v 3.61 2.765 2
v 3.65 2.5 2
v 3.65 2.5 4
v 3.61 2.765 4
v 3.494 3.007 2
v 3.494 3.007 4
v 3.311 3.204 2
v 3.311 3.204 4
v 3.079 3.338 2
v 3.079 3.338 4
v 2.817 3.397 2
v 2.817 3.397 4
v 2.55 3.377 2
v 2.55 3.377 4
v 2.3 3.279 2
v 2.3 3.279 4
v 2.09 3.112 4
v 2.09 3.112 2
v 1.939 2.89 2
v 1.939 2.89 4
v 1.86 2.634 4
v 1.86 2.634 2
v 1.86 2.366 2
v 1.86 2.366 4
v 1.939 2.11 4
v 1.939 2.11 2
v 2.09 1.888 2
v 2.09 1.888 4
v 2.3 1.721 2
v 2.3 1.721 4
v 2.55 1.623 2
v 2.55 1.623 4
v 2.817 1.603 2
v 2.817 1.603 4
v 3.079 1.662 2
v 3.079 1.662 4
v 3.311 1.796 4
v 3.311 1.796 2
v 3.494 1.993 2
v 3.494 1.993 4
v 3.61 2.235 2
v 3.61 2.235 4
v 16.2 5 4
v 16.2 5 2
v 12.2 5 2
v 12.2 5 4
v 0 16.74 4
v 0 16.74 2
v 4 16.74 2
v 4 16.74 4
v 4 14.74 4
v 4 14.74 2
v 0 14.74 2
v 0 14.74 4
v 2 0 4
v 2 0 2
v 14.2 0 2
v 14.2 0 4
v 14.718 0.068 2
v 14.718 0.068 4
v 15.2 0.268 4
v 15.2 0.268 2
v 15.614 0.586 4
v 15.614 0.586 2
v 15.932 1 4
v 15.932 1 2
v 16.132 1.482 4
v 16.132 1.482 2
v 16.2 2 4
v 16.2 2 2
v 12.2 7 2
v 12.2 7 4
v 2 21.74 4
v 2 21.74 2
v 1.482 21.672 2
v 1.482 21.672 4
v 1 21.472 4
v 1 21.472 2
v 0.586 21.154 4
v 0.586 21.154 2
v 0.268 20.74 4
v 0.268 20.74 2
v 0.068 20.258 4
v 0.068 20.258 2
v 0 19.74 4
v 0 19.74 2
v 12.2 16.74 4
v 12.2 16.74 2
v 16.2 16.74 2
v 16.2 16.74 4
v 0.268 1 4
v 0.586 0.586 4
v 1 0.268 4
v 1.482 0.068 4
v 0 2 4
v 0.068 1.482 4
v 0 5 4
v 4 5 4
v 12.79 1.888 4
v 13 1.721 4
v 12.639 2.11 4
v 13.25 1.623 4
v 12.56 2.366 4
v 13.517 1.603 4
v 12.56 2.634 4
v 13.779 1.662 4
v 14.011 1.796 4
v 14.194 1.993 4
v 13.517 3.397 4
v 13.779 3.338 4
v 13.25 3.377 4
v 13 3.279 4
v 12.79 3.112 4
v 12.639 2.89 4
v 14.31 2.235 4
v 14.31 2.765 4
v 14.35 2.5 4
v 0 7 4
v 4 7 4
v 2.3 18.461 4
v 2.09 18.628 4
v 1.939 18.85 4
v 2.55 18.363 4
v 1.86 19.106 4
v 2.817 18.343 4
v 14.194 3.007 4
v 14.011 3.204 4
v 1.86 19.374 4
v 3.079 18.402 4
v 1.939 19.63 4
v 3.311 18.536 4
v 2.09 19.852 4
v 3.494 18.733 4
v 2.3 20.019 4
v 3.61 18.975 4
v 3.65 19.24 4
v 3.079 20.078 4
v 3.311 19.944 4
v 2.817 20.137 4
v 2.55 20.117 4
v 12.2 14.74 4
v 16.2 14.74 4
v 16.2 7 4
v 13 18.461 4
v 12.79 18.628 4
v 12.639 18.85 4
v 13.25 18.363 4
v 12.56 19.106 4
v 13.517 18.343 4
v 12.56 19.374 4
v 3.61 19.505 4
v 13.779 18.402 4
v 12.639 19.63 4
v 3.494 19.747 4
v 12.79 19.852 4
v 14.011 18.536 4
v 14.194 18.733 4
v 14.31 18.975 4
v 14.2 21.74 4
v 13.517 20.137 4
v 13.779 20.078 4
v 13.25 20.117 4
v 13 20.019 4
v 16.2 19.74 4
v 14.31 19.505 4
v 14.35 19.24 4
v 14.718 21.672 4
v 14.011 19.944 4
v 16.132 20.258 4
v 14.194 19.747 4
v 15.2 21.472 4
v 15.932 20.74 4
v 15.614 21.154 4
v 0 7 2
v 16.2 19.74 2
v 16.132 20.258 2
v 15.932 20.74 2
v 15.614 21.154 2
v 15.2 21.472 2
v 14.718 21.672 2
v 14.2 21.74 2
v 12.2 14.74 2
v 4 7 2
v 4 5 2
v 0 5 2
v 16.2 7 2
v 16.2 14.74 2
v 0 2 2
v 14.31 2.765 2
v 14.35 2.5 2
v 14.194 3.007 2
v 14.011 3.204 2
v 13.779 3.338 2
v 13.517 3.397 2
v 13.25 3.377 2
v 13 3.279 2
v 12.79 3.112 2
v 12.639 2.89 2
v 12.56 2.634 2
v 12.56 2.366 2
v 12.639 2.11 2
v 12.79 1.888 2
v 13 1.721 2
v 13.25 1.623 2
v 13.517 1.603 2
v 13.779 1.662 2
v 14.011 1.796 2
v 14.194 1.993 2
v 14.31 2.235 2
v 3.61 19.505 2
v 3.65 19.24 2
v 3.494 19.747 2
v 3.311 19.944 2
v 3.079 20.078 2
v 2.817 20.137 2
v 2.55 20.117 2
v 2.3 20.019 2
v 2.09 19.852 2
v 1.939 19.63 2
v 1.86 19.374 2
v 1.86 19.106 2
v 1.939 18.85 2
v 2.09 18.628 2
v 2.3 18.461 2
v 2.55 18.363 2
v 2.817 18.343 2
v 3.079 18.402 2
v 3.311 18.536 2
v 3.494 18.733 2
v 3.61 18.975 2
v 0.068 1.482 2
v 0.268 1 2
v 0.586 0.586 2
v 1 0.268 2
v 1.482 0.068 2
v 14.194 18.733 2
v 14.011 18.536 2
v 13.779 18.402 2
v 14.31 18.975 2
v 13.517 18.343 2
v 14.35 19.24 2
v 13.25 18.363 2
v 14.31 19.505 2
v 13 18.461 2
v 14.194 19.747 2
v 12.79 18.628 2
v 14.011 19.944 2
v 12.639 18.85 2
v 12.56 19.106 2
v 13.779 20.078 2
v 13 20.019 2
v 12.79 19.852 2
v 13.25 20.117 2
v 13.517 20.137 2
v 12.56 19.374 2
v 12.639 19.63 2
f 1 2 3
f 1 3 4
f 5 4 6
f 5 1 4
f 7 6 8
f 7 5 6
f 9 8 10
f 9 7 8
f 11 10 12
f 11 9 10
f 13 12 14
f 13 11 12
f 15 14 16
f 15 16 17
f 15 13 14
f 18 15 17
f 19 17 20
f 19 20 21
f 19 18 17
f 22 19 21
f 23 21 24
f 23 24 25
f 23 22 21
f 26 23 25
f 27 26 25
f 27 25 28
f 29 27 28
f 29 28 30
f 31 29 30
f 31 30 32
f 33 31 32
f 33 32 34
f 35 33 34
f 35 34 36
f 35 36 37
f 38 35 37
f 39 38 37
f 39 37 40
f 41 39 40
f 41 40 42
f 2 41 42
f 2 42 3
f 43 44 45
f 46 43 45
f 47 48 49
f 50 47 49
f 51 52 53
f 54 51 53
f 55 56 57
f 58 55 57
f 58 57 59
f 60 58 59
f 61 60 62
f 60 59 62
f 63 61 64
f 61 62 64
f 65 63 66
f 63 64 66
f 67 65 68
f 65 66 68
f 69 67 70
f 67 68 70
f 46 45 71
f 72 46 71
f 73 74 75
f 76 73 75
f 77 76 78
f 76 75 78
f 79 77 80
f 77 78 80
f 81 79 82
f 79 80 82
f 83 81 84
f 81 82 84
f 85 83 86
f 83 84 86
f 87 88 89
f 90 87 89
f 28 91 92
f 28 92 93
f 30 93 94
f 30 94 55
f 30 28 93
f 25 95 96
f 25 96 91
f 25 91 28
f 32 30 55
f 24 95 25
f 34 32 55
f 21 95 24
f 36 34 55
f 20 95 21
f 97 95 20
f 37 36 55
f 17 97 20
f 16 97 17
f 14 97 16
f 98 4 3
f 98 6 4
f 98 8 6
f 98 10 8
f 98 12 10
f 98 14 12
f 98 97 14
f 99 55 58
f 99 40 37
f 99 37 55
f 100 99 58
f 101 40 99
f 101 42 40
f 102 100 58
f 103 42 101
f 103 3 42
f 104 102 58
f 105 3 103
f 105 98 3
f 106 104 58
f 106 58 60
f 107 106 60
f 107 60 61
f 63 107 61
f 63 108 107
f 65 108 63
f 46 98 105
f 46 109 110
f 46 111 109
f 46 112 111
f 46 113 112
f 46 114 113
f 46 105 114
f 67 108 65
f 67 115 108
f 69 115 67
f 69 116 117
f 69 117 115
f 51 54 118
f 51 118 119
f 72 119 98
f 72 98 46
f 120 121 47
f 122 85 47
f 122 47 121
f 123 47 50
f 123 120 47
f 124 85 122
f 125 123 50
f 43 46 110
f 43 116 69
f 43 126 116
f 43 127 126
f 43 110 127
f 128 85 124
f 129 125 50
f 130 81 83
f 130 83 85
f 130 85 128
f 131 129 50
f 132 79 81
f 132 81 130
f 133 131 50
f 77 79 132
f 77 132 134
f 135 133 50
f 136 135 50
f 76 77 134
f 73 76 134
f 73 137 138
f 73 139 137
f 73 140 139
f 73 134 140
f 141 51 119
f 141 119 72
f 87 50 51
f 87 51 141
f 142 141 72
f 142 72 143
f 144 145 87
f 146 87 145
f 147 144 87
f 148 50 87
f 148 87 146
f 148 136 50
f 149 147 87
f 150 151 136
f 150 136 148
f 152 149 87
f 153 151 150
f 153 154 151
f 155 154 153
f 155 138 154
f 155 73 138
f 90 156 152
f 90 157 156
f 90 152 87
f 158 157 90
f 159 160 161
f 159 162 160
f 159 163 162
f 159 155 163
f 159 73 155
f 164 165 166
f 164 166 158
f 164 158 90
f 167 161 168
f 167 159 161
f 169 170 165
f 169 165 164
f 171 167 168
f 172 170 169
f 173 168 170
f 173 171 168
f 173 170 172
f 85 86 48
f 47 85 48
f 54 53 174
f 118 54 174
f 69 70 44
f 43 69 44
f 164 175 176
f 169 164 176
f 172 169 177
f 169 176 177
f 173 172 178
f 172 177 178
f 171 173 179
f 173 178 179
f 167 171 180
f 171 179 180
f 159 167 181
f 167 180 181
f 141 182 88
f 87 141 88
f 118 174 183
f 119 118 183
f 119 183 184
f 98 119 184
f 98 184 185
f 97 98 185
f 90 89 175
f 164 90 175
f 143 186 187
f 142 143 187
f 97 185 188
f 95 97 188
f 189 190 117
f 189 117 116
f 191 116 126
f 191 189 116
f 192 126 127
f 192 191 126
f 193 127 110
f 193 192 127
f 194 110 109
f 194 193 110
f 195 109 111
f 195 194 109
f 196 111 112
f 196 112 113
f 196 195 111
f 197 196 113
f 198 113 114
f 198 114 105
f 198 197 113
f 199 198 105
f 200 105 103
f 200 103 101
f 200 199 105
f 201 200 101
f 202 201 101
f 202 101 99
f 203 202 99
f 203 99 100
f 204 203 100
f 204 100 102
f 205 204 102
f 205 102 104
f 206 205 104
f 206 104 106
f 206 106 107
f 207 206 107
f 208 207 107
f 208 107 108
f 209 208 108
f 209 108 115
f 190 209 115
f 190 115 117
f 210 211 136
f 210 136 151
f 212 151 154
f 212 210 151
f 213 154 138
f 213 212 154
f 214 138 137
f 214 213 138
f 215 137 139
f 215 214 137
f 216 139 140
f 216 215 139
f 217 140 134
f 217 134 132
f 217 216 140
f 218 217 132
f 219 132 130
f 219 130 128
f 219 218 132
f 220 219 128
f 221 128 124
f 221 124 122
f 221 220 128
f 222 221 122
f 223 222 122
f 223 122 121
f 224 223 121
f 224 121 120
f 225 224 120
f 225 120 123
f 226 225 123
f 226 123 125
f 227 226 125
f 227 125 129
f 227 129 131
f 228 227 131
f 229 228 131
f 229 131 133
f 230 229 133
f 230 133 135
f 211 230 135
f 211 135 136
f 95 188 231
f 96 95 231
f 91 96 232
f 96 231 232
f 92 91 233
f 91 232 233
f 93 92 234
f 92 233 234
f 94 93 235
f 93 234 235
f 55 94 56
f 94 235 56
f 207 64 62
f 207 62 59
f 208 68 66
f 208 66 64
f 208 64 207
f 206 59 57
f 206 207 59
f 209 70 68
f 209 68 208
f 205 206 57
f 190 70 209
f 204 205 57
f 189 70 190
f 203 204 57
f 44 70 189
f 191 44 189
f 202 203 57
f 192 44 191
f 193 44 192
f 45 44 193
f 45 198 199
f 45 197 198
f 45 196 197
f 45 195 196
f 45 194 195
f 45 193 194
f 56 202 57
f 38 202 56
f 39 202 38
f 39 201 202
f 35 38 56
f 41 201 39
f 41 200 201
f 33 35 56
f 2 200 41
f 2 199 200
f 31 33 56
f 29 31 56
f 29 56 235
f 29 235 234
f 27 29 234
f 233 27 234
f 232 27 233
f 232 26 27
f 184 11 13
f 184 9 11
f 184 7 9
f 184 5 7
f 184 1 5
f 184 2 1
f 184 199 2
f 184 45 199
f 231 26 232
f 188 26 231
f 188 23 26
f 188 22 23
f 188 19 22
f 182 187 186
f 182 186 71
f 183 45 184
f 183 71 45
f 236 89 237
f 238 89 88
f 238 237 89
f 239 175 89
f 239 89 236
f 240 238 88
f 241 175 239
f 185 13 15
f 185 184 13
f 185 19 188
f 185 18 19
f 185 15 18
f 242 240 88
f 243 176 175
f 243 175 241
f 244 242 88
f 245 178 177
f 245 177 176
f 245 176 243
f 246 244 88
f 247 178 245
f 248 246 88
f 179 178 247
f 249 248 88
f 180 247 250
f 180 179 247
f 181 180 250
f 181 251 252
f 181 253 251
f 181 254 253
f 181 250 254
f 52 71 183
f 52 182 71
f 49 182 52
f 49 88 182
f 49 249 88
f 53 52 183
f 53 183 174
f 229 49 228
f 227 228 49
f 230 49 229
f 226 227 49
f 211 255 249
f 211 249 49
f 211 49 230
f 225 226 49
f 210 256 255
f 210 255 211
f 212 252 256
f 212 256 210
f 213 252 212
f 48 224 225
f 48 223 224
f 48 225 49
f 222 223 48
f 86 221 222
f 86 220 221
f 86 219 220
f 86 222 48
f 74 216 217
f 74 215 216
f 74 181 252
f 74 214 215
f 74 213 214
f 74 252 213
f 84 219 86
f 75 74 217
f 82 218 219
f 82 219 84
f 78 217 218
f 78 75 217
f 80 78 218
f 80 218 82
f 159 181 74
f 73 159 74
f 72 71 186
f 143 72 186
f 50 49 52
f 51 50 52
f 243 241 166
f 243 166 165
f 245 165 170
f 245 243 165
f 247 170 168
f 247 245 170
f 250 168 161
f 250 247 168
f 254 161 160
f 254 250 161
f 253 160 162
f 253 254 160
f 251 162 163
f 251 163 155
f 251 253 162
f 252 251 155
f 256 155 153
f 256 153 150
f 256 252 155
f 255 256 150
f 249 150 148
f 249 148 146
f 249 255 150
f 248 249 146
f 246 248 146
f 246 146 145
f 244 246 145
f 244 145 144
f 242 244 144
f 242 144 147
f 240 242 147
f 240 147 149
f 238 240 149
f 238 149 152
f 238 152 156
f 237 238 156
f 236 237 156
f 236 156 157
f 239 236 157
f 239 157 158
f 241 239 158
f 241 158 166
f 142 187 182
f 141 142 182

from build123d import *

# Parameters (mm, degrees)
SKETCH1_R           = 0.9
BOSS_EXTRUDE1_DEPTH = 4
SKETCH2_W           = 16.2
SKETCH2_H           = 21.74
CUT_EXTRUDE1_DEPTH  = 2


with BuildPart() as part:
    # Sketch1 → Boss-Extrude1 (new body)
    with BuildSketch(Plane.XY):
        with BuildLine():
            Line((0, 14.74), (0, 7))
            Line((0, 7), (4, 7))
            Line((4, 7), (4, 5))
            Line((4, 5), (0, 5))
            Line((0, 5), (0, 2))
            ThreePointArc((0, 2), (0.585786438, 0.585786438), (2, 0))
            Line((2, 0), (14.2, 0))
            ThreePointArc((14.2, 0), (15.614213562, 0.585786438), (16.2, 2))
            Line((16.2, 2), (16.2, 5))
            Line((16.2, 5), (12.2, 5))
            Line((12.2, 5), (12.2, 7))
            Line((12.2, 7), (16.2, 7))
            Line((16.2, 7), (16.2, 14.74))
            Line((16.2, 14.74), (12.2, 14.74))
            Line((12.2, 14.74), (12.2, 16.74))
            Line((12.2, 16.74), (16.2, 16.74))
            Line((16.2, 16.74), (16.2, 19.74))
            ThreePointArc((16.2, 19.74), (15.614213562, 21.154213562), (14.2, 21.74))
            Line((14.2, 21.74), (2, 21.74))
            ThreePointArc((2, 21.74), (0.585786438, 21.154213562), (0, 19.74))
            Line((0, 19.74), (0, 16.74))
            Line((0, 16.74), (4, 16.74))
            Line((4, 16.74), (4, 14.74))
            Line((4, 14.74), (0, 14.74))
        make_face()
        with Locations((13.45, 2.5)):
            Circle(SKETCH1_R, mode=Mode.SUBTRACT)
        with Locations((2.75, 19.24)):
            Circle(SKETCH1_R, mode=Mode.SUBTRACT)
        with Locations((2.75, 2.5)):
            Circle(SKETCH1_R, mode=Mode.SUBTRACT)
        with Locations((13.45, 19.24)):
            Circle(SKETCH1_R, mode=Mode.SUBTRACT)
    extrude(amount=BOSS_EXTRUDE1_DEPTH)

    # Sketch2 → Cut-Extrude1 (cut)
    with BuildSketch(Plane(origin=(0, 0, 0), x_dir=(-1, 0, 0), z_dir=(0, 0, -1))):
        with Locations((-8.1, 10.87)):
            Rectangle(SKETCH2_W, SKETCH2_H)
    extrude(amount=-CUT_EXTRUDE1_DEPTH, mode=Mode.SUBTRACT)


solid = part.part
